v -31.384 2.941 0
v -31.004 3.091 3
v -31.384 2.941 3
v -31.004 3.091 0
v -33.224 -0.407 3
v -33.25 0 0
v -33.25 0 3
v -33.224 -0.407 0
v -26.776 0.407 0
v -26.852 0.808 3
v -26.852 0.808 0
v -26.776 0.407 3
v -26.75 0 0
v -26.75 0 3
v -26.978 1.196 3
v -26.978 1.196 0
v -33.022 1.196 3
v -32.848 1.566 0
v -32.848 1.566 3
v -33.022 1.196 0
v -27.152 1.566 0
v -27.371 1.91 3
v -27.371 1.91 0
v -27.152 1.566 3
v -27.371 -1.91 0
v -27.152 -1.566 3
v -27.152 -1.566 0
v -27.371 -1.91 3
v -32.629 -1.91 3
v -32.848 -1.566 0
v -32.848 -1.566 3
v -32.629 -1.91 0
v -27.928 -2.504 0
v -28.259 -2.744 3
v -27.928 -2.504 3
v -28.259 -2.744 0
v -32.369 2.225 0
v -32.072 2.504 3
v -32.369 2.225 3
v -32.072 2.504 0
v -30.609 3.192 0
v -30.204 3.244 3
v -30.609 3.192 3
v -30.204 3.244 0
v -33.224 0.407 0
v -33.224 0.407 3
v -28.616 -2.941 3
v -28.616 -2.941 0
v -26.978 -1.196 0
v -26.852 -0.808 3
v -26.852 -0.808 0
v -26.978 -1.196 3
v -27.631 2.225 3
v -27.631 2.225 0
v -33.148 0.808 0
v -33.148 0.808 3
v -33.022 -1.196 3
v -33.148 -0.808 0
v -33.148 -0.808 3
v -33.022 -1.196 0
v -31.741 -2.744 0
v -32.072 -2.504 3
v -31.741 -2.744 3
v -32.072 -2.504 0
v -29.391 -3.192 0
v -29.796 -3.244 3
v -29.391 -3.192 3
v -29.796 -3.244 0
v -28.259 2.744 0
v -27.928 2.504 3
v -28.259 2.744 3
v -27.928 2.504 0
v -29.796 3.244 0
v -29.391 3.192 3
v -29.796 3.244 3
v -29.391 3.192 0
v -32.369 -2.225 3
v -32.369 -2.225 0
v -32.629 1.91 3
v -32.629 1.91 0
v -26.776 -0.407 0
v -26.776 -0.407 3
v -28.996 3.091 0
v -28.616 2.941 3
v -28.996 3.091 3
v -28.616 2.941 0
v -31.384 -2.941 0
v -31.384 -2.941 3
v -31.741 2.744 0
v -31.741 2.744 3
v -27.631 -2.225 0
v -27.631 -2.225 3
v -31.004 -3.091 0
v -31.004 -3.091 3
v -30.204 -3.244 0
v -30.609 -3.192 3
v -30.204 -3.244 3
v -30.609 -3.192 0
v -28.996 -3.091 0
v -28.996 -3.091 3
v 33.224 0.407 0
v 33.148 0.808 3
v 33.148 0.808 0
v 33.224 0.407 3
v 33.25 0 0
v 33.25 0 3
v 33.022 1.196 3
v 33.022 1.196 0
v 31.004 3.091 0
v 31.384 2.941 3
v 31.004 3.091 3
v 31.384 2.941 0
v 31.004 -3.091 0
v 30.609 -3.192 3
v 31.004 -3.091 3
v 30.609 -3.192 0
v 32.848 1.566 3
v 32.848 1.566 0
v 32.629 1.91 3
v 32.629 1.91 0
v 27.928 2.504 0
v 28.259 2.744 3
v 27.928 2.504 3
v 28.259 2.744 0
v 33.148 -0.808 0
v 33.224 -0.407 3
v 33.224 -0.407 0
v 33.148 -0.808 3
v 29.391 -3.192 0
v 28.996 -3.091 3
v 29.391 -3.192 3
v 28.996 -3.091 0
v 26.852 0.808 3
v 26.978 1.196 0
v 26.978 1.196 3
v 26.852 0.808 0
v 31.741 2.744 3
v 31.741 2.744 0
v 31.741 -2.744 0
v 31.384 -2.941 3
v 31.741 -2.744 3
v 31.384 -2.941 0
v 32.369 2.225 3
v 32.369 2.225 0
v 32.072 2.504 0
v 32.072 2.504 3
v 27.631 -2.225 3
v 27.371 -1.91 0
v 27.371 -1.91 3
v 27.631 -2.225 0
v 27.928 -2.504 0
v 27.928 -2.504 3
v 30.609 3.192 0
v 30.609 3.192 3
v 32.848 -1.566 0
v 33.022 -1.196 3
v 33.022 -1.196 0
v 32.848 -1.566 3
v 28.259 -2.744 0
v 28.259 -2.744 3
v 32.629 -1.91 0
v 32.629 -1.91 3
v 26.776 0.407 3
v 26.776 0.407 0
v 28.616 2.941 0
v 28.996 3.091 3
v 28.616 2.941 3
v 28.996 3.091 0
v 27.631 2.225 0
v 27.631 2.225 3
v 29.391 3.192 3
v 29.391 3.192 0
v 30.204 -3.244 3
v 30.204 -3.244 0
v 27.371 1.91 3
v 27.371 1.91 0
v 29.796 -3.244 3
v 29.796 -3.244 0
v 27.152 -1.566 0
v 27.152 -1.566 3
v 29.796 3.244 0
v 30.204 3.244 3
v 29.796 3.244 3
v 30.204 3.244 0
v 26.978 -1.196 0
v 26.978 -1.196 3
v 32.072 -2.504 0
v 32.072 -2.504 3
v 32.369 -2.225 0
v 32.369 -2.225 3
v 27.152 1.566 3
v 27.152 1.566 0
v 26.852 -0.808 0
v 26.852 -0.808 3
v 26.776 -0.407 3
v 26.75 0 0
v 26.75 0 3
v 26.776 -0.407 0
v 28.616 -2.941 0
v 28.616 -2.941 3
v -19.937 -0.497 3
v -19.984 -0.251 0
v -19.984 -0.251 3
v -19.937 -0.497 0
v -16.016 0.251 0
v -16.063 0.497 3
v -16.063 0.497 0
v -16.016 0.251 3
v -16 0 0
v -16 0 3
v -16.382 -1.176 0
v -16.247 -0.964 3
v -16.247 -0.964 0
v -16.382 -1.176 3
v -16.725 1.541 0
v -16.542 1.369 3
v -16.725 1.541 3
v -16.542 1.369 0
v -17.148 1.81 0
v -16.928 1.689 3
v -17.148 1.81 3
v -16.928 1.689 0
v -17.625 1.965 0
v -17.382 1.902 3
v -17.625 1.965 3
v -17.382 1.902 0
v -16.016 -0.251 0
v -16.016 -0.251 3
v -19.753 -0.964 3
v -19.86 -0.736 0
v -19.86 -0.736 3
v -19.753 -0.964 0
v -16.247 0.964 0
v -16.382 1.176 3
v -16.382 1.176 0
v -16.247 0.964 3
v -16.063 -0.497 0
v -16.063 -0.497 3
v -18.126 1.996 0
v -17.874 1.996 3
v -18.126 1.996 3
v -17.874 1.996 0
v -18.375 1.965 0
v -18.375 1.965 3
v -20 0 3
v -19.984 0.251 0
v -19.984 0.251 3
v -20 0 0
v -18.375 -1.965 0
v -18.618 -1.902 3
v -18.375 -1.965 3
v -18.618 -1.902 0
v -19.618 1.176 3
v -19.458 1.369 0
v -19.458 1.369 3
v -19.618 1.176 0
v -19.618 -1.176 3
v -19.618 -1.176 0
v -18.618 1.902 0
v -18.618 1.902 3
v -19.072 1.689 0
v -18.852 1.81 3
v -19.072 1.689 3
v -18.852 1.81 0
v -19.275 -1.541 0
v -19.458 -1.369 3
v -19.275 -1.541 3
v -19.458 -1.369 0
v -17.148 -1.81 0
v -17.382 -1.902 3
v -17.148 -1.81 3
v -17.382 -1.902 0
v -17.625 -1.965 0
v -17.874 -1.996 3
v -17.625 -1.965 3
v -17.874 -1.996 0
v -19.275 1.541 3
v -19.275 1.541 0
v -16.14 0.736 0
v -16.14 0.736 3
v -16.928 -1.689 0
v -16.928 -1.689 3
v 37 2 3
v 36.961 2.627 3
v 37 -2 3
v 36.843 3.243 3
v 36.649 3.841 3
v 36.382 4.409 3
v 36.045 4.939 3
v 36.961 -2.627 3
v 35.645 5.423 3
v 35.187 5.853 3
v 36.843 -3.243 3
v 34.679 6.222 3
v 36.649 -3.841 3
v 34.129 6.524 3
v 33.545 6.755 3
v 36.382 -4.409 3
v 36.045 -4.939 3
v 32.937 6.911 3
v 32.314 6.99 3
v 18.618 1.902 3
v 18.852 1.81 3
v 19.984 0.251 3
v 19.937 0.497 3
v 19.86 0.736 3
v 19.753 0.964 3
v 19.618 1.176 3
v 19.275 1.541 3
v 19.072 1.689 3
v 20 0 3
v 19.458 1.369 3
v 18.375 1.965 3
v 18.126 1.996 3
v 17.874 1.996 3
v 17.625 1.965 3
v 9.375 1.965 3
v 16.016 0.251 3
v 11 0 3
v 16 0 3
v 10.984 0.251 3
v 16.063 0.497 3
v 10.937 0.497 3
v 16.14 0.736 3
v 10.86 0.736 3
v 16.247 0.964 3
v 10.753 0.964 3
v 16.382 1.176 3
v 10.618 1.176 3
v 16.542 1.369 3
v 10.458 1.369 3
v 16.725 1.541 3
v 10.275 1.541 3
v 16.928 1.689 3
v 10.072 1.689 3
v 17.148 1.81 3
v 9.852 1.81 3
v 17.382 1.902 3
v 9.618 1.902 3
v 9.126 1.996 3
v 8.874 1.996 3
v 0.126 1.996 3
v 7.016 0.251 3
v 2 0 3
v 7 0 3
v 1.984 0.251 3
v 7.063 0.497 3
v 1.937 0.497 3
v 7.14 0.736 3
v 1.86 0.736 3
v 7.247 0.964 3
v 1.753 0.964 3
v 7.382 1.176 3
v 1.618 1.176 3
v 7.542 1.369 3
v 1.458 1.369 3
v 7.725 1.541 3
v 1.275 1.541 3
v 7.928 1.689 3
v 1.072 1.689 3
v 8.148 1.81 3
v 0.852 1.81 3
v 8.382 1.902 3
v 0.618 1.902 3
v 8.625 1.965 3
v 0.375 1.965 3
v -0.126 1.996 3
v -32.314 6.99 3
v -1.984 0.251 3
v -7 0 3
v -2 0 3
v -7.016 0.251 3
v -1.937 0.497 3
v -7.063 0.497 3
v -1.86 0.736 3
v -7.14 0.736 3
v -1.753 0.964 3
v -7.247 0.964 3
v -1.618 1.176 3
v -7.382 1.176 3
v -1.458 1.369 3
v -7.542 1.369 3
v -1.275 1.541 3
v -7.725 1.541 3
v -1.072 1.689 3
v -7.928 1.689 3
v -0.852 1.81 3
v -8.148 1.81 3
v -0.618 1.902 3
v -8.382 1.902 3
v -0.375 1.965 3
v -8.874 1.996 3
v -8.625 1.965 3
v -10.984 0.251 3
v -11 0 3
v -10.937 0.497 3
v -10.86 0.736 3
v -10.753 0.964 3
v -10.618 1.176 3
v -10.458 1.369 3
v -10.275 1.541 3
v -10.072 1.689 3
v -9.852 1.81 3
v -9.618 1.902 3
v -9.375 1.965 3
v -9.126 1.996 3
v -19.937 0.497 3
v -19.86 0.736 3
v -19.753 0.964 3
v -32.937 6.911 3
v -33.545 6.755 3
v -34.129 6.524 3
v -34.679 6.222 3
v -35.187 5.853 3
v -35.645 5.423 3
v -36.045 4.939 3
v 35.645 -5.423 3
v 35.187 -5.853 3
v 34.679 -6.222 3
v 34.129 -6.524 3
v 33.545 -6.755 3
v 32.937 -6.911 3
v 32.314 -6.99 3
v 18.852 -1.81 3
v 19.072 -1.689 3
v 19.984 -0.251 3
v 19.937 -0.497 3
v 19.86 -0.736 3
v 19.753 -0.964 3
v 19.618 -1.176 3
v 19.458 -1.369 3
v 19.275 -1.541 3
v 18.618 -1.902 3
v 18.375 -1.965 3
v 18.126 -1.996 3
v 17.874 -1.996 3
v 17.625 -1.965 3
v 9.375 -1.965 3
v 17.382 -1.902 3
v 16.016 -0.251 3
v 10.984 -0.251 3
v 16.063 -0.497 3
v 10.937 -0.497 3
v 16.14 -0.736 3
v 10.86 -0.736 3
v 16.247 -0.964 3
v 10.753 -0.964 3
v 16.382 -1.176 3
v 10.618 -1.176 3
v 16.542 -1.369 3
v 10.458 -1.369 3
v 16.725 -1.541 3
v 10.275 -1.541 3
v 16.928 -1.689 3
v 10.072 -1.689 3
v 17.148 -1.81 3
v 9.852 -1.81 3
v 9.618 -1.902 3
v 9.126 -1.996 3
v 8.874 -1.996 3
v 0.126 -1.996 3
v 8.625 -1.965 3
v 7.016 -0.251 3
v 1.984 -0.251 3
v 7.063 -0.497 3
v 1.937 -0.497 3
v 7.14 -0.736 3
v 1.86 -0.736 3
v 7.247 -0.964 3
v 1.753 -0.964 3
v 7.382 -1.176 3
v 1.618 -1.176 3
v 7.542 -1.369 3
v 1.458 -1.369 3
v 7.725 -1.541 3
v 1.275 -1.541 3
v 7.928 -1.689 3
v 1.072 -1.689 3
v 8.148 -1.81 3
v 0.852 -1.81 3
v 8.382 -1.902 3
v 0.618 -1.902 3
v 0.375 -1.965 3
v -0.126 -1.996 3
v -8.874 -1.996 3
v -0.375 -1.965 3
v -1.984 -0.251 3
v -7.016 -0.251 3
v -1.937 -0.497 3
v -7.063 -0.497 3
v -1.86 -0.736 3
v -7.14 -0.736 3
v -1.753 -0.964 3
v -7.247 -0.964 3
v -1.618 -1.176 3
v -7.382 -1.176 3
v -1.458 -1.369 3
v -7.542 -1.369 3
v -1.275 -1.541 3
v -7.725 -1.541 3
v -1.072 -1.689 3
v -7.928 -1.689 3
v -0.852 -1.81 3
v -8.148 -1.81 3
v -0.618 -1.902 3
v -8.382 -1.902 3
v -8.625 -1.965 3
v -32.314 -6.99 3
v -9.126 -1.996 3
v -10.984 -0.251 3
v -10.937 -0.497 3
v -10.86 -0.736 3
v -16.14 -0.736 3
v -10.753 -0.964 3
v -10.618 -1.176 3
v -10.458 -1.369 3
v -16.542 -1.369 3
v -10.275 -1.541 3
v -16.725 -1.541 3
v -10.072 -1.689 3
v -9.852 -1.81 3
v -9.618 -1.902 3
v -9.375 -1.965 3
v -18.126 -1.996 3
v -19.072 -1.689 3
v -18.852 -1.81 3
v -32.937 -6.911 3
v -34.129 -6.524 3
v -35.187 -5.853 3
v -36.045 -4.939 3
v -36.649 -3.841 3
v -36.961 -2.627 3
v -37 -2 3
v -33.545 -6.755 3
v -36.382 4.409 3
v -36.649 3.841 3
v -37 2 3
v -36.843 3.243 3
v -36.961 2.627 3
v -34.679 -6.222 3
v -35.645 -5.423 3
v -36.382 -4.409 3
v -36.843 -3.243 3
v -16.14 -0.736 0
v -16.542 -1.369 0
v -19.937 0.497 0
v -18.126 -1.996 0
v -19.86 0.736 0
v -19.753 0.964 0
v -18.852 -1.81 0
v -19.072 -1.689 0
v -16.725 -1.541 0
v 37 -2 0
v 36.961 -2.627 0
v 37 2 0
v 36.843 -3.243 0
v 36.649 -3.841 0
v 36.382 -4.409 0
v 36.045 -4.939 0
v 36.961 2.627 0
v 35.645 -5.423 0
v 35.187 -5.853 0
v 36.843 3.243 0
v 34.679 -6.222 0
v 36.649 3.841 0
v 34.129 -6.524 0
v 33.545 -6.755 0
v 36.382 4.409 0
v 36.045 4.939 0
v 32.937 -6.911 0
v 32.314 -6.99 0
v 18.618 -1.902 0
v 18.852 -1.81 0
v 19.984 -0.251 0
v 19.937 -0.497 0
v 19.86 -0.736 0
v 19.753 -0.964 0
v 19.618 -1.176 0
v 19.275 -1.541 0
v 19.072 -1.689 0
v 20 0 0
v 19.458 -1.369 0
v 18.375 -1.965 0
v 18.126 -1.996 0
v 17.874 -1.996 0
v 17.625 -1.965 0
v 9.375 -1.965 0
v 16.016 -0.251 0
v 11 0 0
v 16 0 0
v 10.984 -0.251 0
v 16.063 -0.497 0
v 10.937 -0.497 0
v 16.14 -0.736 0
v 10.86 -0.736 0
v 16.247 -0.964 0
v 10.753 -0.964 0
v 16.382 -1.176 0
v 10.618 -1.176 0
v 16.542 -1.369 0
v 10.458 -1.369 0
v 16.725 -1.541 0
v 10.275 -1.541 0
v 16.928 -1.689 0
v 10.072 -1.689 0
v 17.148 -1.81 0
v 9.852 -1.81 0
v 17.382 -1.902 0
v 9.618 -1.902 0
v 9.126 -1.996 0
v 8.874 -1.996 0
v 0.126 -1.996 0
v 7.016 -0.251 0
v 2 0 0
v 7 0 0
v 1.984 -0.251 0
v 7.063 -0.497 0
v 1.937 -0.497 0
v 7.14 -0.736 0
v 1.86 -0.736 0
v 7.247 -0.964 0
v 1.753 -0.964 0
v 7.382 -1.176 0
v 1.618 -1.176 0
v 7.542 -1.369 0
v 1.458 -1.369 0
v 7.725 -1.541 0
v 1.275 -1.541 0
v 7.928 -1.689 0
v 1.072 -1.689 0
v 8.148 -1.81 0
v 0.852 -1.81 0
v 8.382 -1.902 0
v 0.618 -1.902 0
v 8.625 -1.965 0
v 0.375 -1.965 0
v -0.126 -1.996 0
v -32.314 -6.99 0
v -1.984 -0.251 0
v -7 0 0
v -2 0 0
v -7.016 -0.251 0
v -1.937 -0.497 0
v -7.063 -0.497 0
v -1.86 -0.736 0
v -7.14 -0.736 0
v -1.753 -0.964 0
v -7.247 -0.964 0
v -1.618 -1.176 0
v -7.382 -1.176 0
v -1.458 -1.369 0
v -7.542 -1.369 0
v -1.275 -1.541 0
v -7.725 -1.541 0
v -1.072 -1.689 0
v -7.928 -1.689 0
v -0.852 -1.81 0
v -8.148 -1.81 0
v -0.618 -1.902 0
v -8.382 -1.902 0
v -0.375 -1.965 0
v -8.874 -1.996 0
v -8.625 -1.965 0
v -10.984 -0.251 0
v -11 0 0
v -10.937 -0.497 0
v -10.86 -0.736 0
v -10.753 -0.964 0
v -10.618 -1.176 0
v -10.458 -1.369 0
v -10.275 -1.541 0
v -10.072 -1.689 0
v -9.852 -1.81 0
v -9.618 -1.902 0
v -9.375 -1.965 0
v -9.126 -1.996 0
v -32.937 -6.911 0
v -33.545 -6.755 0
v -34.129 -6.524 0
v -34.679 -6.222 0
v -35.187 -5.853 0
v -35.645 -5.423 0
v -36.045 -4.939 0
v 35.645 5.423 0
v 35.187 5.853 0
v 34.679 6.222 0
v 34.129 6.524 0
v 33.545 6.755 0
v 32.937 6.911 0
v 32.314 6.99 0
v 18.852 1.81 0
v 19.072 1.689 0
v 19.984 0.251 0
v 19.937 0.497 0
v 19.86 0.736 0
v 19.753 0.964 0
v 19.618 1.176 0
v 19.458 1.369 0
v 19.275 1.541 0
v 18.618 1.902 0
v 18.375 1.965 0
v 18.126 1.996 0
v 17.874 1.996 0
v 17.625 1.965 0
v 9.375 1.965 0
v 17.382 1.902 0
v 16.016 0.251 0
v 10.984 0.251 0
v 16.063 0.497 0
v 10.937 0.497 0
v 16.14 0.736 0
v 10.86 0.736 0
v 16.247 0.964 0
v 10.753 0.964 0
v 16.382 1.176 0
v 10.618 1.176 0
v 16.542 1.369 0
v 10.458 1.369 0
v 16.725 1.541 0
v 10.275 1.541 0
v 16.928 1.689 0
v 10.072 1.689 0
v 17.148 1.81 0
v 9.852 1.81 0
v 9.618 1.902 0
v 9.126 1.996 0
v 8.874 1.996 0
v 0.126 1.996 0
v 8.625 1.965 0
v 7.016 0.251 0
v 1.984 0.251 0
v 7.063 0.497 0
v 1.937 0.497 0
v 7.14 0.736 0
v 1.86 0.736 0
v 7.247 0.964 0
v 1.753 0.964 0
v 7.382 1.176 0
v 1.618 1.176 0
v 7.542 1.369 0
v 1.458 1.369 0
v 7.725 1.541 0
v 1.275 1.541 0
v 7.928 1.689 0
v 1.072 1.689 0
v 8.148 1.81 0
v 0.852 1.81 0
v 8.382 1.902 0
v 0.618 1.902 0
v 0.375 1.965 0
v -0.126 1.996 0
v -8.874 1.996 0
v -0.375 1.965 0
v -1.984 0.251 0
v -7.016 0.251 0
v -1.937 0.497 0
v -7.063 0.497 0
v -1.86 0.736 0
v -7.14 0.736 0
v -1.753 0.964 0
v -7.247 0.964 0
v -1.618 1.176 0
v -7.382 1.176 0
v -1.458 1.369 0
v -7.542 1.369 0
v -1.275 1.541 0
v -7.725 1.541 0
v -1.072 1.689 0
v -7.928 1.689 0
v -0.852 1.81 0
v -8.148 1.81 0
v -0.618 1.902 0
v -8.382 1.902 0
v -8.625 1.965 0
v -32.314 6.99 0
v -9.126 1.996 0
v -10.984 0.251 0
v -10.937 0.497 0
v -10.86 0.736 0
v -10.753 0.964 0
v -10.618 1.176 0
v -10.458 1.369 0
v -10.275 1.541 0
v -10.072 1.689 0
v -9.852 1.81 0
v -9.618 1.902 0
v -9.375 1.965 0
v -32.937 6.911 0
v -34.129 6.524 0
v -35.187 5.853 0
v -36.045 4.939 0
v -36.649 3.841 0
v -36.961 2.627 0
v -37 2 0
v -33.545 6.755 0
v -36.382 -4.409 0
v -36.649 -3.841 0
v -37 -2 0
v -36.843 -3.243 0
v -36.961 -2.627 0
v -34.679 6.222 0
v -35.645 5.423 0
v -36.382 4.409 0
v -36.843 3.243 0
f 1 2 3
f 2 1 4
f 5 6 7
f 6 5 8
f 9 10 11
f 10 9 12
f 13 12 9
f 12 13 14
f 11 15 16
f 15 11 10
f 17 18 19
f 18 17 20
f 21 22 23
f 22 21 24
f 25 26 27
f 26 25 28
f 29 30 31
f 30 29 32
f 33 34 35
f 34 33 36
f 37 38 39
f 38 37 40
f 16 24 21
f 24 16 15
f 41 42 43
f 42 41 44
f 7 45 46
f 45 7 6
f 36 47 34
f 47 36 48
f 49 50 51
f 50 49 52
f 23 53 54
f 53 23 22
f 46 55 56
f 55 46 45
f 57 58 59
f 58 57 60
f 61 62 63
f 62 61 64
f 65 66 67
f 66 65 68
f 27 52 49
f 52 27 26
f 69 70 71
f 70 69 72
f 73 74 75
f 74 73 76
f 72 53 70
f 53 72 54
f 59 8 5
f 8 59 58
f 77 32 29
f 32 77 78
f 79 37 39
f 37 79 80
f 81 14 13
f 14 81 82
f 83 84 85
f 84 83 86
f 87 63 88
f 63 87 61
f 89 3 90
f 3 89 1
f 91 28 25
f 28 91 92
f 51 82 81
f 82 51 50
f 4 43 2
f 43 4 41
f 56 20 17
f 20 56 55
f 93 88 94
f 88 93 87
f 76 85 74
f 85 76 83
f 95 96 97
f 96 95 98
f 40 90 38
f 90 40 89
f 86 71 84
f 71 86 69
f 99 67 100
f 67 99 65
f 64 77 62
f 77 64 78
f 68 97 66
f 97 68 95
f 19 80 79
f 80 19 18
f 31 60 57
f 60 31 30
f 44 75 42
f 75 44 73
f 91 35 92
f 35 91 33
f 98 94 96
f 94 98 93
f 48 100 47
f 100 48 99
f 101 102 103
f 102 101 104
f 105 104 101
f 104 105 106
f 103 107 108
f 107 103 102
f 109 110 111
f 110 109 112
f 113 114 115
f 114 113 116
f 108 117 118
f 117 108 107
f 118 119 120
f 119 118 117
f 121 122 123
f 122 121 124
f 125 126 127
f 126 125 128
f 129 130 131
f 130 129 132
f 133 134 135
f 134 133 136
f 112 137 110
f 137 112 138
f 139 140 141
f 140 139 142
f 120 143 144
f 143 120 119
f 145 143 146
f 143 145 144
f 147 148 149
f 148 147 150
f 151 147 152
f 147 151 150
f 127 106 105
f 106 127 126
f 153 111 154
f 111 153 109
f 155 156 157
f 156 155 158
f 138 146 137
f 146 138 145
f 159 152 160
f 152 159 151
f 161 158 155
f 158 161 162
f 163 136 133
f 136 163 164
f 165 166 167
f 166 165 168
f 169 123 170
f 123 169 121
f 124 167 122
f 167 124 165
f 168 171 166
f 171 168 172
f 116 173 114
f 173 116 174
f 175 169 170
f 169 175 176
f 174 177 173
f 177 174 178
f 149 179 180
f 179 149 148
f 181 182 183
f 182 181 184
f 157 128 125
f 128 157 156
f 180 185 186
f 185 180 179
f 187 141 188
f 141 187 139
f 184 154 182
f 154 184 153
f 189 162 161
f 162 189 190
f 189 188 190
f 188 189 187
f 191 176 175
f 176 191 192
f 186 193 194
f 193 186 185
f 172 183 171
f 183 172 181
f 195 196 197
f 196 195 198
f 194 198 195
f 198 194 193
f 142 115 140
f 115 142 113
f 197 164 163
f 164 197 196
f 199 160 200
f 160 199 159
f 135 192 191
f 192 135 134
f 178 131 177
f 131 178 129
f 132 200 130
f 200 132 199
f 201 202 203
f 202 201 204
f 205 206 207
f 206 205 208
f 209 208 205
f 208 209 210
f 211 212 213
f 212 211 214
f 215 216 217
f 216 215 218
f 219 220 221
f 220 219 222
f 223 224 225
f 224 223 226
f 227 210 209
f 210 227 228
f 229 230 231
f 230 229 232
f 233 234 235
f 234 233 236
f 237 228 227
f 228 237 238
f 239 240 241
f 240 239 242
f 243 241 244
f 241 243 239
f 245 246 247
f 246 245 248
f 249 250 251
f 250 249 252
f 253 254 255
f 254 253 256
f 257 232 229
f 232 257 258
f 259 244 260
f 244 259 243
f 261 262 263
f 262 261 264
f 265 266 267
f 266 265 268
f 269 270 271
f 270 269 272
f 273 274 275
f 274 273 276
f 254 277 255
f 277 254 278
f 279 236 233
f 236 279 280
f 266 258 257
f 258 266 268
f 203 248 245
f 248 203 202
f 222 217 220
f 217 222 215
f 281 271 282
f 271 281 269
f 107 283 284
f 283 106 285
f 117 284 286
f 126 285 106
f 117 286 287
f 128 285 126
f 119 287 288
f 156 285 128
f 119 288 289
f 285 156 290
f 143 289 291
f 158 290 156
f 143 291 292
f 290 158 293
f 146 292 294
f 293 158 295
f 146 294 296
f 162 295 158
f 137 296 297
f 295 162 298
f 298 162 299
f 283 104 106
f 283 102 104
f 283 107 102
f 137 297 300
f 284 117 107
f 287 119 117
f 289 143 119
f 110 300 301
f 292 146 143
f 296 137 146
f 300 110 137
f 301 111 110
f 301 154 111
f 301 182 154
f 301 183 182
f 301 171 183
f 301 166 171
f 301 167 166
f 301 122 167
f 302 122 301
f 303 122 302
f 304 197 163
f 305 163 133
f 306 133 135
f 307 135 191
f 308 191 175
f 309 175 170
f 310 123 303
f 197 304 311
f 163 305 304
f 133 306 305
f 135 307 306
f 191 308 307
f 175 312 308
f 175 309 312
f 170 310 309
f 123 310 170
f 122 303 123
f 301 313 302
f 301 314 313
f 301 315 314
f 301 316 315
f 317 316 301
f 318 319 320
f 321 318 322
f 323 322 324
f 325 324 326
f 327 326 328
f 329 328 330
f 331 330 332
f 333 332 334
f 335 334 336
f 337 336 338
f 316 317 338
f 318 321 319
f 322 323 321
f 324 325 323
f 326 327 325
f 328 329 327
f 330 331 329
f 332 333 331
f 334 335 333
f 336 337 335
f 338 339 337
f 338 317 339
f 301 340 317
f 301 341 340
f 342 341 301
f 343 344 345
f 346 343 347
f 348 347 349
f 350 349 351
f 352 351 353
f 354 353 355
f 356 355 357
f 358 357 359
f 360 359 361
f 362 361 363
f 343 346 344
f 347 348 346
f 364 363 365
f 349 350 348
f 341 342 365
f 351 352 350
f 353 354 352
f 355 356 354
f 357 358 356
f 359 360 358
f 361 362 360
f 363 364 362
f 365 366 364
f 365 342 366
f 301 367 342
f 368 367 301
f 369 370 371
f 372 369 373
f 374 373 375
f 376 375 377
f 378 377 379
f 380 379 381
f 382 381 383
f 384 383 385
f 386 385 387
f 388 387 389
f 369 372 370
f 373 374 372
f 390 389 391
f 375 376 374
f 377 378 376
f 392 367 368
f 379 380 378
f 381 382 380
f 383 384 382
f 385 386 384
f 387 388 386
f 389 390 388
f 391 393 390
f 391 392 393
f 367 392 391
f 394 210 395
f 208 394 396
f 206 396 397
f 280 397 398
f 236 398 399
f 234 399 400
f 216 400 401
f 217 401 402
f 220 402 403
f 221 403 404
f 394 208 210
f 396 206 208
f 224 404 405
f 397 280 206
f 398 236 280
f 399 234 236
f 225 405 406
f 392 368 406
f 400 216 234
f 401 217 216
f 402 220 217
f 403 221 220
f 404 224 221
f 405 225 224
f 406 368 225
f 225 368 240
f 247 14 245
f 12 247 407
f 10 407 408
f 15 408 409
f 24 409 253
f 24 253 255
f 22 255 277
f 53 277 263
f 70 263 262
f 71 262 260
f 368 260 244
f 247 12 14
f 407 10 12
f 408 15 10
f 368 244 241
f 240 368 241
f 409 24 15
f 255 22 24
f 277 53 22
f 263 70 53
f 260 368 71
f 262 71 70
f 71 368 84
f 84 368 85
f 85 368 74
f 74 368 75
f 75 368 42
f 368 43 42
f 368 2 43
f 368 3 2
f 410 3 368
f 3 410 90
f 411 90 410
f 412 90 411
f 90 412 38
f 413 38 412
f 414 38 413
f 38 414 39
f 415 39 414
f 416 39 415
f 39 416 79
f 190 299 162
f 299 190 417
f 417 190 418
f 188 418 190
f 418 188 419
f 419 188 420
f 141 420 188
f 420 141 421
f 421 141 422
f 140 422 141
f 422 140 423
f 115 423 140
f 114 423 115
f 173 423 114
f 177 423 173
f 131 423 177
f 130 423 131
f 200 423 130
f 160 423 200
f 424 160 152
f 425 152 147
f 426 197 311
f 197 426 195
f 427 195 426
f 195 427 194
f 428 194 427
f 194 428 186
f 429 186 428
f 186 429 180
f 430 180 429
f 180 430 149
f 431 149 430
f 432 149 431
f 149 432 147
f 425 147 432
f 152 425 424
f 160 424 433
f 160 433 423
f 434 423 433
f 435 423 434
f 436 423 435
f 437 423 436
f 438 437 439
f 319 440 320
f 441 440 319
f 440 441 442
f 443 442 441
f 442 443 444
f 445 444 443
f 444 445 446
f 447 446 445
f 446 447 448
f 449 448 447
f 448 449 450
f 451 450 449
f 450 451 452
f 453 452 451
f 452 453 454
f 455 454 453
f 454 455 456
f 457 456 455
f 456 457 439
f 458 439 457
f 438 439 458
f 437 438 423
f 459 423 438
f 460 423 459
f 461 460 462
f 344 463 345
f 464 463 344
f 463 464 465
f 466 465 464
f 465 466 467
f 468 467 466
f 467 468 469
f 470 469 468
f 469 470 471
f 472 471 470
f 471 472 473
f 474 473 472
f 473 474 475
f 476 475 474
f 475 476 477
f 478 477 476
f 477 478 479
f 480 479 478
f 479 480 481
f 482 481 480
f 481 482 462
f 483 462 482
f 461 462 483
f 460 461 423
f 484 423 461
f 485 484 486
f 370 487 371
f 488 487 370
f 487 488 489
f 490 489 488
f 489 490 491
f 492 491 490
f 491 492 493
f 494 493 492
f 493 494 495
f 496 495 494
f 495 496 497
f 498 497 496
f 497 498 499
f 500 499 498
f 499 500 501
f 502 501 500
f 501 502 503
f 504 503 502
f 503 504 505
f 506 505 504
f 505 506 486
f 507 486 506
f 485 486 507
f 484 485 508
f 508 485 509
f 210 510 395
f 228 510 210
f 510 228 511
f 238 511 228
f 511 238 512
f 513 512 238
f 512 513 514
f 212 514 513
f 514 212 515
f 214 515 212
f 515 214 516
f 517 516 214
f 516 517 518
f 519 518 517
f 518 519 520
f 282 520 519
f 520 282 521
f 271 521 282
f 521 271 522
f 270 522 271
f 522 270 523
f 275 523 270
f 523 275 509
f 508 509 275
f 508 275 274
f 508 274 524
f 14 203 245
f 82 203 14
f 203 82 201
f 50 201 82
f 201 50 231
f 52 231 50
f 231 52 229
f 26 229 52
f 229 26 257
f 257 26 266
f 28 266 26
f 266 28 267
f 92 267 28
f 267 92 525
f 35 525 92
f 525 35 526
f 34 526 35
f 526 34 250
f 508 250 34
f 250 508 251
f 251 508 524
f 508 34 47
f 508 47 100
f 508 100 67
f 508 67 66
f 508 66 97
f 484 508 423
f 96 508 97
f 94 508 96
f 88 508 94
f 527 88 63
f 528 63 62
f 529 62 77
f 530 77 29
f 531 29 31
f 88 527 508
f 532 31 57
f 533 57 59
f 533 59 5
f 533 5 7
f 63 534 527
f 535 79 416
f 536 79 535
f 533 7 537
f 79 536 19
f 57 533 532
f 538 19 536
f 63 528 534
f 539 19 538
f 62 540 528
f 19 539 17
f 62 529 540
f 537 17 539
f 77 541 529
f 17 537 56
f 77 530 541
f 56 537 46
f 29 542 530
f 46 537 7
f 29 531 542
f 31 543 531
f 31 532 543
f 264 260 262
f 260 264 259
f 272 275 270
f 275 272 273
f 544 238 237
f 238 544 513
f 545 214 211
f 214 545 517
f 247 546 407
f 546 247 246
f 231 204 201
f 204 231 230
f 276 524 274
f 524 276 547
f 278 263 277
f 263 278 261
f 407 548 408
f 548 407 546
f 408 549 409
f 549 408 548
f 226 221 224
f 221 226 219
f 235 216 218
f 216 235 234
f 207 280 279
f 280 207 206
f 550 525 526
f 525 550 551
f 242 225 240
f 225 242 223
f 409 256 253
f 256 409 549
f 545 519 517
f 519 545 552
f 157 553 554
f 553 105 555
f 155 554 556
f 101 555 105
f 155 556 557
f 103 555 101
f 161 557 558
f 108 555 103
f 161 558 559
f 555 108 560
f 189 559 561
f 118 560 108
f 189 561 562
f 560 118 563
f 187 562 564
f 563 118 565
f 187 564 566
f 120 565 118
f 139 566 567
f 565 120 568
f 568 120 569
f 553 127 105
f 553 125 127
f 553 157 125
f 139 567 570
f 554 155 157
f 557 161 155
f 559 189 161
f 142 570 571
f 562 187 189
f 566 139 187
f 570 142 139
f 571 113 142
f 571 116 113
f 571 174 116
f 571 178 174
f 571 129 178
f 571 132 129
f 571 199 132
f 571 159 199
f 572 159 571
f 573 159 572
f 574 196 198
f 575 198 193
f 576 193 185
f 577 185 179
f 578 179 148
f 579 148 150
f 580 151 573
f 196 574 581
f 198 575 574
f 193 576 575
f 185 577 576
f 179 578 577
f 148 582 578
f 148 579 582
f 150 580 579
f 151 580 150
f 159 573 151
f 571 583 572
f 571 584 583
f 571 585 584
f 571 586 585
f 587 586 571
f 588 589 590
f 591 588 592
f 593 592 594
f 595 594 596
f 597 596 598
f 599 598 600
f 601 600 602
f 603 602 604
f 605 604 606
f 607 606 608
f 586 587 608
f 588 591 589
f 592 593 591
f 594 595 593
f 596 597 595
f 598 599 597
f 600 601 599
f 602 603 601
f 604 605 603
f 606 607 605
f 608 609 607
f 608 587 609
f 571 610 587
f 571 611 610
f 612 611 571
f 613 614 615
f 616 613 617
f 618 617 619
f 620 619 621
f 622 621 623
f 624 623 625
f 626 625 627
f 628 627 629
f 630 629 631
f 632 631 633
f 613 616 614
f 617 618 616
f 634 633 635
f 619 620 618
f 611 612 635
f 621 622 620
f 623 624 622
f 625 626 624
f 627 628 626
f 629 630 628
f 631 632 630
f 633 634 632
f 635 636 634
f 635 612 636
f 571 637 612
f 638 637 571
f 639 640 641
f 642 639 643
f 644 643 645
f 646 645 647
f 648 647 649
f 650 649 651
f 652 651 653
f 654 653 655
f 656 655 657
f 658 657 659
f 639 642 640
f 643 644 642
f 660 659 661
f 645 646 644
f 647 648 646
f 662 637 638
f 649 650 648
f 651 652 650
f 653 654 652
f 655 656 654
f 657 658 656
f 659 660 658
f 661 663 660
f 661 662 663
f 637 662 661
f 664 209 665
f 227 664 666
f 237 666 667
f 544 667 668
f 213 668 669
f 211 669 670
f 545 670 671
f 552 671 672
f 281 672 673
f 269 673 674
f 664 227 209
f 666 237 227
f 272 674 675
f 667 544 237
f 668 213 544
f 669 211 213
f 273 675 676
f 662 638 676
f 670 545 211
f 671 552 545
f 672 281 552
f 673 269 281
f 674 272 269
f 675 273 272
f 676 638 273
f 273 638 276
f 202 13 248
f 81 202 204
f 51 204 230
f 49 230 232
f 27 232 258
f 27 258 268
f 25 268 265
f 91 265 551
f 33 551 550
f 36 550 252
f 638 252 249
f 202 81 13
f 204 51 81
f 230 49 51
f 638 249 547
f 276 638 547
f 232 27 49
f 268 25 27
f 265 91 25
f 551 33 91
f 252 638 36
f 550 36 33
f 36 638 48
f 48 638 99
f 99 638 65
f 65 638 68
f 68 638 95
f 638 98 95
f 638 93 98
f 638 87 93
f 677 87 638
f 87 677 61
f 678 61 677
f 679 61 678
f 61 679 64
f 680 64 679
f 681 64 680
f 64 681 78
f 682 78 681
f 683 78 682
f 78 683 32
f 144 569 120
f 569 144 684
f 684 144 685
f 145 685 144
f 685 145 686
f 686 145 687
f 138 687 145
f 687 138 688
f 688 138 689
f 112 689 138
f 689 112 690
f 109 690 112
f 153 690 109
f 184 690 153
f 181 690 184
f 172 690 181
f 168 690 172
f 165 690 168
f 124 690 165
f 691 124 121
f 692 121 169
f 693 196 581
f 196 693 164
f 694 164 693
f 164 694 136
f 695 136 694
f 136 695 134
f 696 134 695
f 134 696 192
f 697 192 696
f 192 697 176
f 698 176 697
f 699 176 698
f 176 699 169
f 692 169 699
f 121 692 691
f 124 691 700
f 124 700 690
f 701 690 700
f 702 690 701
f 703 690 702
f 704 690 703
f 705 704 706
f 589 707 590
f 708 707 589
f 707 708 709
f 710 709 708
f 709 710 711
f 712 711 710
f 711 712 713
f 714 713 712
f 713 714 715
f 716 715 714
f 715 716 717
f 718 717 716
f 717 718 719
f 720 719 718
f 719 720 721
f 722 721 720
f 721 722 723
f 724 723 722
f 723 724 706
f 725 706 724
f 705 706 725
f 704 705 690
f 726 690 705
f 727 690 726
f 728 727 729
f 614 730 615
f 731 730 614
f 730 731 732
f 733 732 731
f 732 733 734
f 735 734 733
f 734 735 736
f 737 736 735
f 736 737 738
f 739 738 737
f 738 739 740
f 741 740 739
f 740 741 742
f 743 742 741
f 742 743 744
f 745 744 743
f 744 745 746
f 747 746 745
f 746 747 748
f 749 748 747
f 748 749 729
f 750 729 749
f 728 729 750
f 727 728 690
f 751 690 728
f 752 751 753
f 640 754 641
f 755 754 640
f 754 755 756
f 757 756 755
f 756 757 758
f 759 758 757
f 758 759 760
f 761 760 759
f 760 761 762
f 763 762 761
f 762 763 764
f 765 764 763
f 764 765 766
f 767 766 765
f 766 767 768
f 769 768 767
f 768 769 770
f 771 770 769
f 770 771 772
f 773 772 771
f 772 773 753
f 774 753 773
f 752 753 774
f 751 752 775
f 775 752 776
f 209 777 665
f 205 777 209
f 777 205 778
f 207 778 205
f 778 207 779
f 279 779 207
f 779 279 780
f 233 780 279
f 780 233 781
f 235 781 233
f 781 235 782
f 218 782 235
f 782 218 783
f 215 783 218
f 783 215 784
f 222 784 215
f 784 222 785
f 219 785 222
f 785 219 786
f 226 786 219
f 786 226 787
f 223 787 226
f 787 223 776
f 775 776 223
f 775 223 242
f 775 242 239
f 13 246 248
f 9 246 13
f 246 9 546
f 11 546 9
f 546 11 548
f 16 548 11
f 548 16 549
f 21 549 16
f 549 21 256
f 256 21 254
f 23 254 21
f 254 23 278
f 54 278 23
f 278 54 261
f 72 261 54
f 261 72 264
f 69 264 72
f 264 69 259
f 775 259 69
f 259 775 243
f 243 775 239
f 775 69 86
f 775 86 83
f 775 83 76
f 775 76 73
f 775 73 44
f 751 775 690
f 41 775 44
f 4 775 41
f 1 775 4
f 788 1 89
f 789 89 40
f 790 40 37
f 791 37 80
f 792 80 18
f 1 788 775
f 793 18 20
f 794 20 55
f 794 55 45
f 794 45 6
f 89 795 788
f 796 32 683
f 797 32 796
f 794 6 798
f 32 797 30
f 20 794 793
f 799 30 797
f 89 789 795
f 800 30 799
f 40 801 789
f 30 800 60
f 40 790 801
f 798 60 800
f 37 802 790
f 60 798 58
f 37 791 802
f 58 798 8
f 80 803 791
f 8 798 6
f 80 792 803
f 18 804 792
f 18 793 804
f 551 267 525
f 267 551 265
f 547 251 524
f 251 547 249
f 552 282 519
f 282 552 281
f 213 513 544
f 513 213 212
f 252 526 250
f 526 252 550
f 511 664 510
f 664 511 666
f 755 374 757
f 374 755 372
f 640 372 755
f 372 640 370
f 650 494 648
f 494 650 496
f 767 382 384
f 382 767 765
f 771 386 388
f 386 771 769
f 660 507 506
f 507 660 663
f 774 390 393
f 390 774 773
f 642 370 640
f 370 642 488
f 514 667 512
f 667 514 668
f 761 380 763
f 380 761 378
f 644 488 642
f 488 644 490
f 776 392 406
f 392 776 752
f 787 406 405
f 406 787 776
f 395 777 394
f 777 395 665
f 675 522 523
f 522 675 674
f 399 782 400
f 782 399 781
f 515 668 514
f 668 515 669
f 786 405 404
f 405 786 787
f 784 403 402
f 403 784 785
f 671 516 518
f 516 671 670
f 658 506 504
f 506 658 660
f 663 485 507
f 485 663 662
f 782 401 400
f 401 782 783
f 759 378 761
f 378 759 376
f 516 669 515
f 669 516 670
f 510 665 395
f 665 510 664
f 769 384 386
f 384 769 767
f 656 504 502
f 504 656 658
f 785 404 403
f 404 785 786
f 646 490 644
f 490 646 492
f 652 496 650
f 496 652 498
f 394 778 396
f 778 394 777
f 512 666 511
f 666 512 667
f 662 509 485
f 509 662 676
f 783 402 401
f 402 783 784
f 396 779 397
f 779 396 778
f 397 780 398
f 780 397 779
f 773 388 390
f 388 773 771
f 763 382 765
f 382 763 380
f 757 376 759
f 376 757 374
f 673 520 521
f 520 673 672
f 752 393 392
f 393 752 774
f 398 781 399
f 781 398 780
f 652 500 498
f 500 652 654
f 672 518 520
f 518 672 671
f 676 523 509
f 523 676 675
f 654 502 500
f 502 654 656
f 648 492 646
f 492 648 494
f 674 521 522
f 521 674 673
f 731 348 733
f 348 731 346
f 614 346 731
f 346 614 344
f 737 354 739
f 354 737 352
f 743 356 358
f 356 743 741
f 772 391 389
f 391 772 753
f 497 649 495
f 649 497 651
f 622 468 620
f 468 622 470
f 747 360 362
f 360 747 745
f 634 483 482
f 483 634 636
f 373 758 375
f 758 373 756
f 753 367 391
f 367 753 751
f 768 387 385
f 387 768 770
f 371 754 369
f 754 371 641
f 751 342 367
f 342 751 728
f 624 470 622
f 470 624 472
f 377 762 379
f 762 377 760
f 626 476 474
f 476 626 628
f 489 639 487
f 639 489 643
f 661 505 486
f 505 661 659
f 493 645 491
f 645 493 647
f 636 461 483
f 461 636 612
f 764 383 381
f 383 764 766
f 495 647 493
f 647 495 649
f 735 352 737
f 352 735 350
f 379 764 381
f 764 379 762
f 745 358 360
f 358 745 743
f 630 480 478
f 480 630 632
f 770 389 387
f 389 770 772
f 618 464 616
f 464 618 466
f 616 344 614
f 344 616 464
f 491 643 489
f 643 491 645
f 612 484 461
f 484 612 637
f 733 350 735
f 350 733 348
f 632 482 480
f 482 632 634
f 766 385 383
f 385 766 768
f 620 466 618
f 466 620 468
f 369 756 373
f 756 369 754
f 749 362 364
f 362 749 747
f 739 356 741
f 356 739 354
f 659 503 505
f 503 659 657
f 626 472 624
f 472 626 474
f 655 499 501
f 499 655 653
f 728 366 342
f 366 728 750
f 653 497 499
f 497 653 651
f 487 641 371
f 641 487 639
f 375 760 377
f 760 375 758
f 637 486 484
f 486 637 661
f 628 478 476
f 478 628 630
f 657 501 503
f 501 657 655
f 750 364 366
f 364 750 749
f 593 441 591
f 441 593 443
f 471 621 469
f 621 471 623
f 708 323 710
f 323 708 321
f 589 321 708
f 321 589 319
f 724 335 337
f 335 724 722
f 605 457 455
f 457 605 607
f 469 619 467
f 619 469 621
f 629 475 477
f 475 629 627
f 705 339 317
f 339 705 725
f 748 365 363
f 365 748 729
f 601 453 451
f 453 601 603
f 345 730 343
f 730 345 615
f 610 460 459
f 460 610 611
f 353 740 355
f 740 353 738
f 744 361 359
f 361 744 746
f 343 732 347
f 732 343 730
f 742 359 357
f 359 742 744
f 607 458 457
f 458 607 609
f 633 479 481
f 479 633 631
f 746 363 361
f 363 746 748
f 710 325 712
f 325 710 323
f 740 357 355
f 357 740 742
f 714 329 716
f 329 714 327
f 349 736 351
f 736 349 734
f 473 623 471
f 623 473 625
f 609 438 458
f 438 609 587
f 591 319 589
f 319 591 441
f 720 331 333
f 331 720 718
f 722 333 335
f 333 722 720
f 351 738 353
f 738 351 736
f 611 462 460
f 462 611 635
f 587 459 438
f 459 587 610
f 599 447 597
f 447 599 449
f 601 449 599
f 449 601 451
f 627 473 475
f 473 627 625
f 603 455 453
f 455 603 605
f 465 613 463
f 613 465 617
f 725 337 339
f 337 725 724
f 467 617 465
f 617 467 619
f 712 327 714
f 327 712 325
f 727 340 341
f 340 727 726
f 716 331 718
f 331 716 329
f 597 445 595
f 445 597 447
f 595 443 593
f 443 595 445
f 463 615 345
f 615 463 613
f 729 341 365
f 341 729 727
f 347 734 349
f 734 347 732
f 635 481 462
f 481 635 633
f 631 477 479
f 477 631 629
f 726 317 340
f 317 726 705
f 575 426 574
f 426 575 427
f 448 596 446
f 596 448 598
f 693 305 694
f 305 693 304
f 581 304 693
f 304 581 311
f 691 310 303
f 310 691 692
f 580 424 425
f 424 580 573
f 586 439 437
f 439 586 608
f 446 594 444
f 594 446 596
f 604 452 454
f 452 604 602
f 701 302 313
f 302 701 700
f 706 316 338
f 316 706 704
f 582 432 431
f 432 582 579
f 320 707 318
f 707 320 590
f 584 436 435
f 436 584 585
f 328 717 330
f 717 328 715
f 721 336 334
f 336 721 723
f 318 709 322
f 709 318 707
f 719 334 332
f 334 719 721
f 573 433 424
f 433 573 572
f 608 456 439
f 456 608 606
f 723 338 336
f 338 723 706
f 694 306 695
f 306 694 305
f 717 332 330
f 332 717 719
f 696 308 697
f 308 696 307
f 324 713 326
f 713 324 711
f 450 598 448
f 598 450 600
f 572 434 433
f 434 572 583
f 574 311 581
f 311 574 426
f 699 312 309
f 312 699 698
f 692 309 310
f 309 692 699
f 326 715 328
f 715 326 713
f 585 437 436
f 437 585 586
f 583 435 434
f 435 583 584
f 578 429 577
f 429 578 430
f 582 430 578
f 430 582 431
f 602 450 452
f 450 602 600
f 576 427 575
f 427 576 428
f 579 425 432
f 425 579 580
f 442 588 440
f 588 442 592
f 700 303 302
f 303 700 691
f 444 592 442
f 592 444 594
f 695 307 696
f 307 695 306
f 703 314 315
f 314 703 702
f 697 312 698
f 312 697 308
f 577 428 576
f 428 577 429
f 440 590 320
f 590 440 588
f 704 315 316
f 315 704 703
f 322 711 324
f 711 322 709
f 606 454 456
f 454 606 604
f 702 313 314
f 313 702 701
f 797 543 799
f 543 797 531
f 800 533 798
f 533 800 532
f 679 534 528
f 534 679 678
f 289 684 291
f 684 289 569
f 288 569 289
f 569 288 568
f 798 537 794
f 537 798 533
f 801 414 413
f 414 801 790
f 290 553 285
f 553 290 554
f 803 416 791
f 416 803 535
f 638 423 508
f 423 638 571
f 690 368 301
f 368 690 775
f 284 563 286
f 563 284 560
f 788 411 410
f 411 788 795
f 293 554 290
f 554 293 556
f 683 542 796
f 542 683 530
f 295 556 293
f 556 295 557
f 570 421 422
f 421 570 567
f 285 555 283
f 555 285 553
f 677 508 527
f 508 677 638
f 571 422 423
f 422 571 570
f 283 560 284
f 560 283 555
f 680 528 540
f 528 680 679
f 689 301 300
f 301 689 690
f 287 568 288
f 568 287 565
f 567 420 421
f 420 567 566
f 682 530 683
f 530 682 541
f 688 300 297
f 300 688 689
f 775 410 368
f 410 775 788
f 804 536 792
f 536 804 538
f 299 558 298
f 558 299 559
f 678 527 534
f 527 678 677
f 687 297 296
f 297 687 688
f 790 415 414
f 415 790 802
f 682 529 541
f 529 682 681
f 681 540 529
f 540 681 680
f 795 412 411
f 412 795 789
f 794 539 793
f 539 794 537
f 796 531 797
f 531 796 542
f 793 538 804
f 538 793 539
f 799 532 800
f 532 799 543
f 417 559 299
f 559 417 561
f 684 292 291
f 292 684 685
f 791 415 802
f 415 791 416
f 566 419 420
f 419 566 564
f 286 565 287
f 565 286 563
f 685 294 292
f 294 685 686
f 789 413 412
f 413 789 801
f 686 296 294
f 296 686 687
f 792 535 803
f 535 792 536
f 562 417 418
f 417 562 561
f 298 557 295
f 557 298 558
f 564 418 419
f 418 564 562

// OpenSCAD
$fn = 50;


difference() {
	union() {
		hull() {
			translate(v = [-32.0000000000, 2.0000000000, 0]) {
				cylinder(h = 3, r = 5);
			}
			translate(v = [32.0000000000, 2.0000000000, 0]) {
				cylinder(h = 3, r = 5);
			}
			translate(v = [-32.0000000000, -2.0000000000, 0]) {
				cylinder(h = 3, r = 5);
			}
			translate(v = [32.0000000000, -2.0000000000, 0]) {
				cylinder(h = 3, r = 5);
			}
		}
	}
	union() {
		#translate(v = [-30.0000000000, 0.0000000000, 0]) {
			cylinder(h = 3, r = 3.2500000000);
		}
		#translate(v = [30.0000000000, 0.0000000000, 0]) {
			cylinder(h = 3, r = 3.2500000000);
		}
		#translate(v = [-30.0000000000, 0.0000000000, -100.0000000000]) {
			cylinder(h = 200, r = 3.2500000000);
		}
		#translate(v = [-30.0000000000, 0.0000000000, -100.0000000000]) {
			cylinder(h = 200, r = 3.2500000000);
		}
		#translate(v = [30.0000000000, 0.0000000000, -100.0000000000]) {
			cylinder(h = 200, r = 3.2500000000);
		}
		#translate(v = [30.0000000000, 0.0000000000, -100.0000000000]) {
			cylinder(h = 200, r = 3.2500000000);
		}
		#translate(v = [-30.0000000000, 0.0000000000, 0]) {
			cylinder(h = 3, r = 1.8000000000);
		}
		#translate(v = [30.0000000000, 0.0000000000, 0]) {
			cylinder(h = 3, r = 1.8000000000);
		}
		#translate(v = [-30.0000000000, 0.0000000000, 0]) {
			cylinder(h = 3, r = 1.8000000000);
		}
		#translate(v = [30.0000000000, 0.0000000000, 0]) {
			cylinder(h = 3, r = 1.8000000000);
		}
		#translate(v = [-30.0000000000, 0.0000000000, 0]) {
			cylinder(h = 3, r = 1.8000000000);
		}
		#translate(v = [30.0000000000, 0.0000000000, 0]) {
			cylinder(h = 3, r = 1.8000000000);
		}
		#translate(v = [-18.0000000000, 0, 0]) {
			cylinder(h = 3, r = 2.0000000000);
		}
		#translate(v = [-9.0000000000, 0, 0]) {
			cylinder(h = 3, r = 2.0000000000);
		}
		#cylinder(h = 3, r = 2.0000000000);
		#translate(v = [9.0000000000, 0, 0]) {
			cylinder(h = 3, r = 2.0000000000);
		}
		#translate(v = [18.0000000000, 0, 0]) {
			cylinder(h = 3, r = 2.0000000000);
		}
	}
}
